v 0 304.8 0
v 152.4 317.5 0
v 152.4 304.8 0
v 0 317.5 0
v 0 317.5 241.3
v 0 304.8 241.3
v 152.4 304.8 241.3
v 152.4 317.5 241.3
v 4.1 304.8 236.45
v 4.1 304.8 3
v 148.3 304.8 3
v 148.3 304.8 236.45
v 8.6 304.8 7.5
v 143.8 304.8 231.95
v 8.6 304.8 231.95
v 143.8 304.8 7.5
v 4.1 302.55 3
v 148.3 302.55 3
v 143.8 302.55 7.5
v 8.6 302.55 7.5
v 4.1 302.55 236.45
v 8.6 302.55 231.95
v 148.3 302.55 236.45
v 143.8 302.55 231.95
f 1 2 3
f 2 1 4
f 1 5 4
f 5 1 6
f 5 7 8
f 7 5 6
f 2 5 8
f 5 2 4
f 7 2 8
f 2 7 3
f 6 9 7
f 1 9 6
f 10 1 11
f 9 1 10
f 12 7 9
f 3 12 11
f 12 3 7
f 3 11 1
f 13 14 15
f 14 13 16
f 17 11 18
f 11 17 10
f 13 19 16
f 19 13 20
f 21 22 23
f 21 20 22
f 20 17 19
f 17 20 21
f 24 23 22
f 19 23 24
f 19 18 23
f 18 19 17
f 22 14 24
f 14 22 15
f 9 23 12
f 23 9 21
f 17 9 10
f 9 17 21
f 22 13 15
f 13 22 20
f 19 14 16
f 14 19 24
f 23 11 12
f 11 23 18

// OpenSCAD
//Box Y = 9.5 inch
//Box Z = 12 inch
//Box X = 6 inch

$fn = 80;
//Dimensions are in mm

//Front/Back Panel
frontWidth = 152.4;
//Side Panel
sideWidth = 304.8;
//Top/Bottom Panel
topWidth = frontWidth;
topLength = sideWidth;

boxHeight = 241.3;
boxThickness = 12.7;

//subWoofer Dimensions
wooferDiameter = 122;
wooferX = sideWidth/2;
wooferY = 101.6;
wooferScrewDiameter = 2.5;
wooferScrewX = 51.75;
wooferScrewY = 51.75;

//Terminal Hole Dimensions
terminalDiameter = 5.5;
terminalY = (frontWidth)/2;
terminal1X =(sideWidth)/2 + 15;
terminal2X = (sideWidth)/2 - 15;

//port Dimensions
portDiameter = 67;
portX = (frontWidth)/2;
portY = boxHeight -57.15;

//Connection Joints/Grooves
grooveThickness = 6;
grooveDepth = 6;
connectThickness = 4.5;
connectDepth = 4.5;
// difference(){
// union(){
//     difference(){
//     //Front Panel
//     linear_extrude(boxHeight)
//     square([frontWidth, boxThickness]);

//     translate([portX, boxThickness, portY])
//     rotate([90,0, 0])
//     linear_extrude(boxThickness)
//     circle(d=portDiameter);     
//     };

//     //Side Panel
//     translate([0, sideWidth-boxThickness, 0])
//     rotate([90,0,0])
//     linear_extrude(sideWidth-boxThickness)
//     square([boxThickness, boxHeight]);

//     //Other Side Panel

//     difference(){
//         translate([frontWidth - boxThickness, sideWidth-boxThickness, 0])
//         rotate([90,0,0])
//         linear_extrude(sideWidth-boxThickness)
//         square([boxThickness, boxHeight]);
//         //Subwoofer position
//         translate([frontWidth - boxThickness,wooferX, wooferY ])
//         rotate([0,90,0])
//         linear_extrude(boxThickness)
//         circle(d = wooferDiameter);
        
//         //subWoofer Screws
//         translate([frontWidth - boxThickness, wooferX - wooferScrewX, wooferY - wooferScrewY])
//         rotate([0,90,0])
//         linear_extrude(boxThickness)
//         circle(d=wooferScrewDiameter);
        
//         translate([frontWidth - boxThickness, wooferX + wooferScrewX, wooferY - wooferScrewY])
//         rotate([0,90,0])
//         linear_extrude(boxThickness)
//         circle(d=wooferScrewDiameter);

//         translate([frontWidth - boxThickness, wooferX - wooferScrewX, wooferY + wooferScrewY])
//         rotate([0,90,0])
//         linear_extrude(boxThickness)
//         circle(d=wooferScrewDiameter);

//         translate([frontWidth - boxThickness, wooferX + wooferScrewX, wooferY + wooferScrewY])
//         rotate([0,90,0])
//         linear_extrude(boxThickness)
//         circle(d=wooferScrewDiameter);

//     }
//     //Bottom Panel
//     linear_extrude(boxThickness)
//     square([frontWidth, sideWidth-boxThickness]);
    
//     //Top Panel
//     difference(){
//     translate([0,0, boxHeight - boxThickness])
//     linear_extrude(boxThickness)
//     square([frontWidth, sideWidth-boxThickness]);
    
//     //Terminal holes
//     translate([terminalY, terminal1X, boxHeight- boxThickness])
//     linear_extrude(boxThickness)
//     circle(d = terminalDiameter);
//     translate([terminalY, terminal2X, boxHeight- boxThickness])
//     linear_extrude(boxThickness)
//     circle(d = terminalDiameter);
//     }

// }

// //Add grooves to box
// translate([frontWidth/2,sideWidth - boxThickness, grooveThickness/2])
// linear_extrude(grooveDepth)
// square([frontWidth - boxThickness, grooveThickness], center = true);

// translate([frontWidth/2,sideWidth - boxThickness,boxHeight - grooveThickness/2 - boxThickness/2])
// linear_extrude(grooveDepth)
// square([frontWidth - boxThickness, grooveThickness], center = true);

// translate([boxThickness/2, sideWidth - boxThickness, grooveThickness/2])
// linear_extrude(boxHeight - boxThickness/2)
// square([grooveThickness, grooveThickness], center = true);

// translate([frontWidth - boxThickness/2, sideWidth - boxThickness, grooveThickness/2])
// linear_extrude(boxHeight - boxThickness/2)
// square([grooveThickness, grooveThickness], center = true);
// }

    //Back Panel
translate([0, (sideWidth),0])
linear_extrude(boxHeight)
square([frontWidth, boxThickness]);

// //Add grooves to box
translate([frontWidth/2,sideWidth, grooveThickness/2])
linear_extrude(connectDepth)
square([frontWidth - boxThickness, connectThickness], center = true);

translate([frontWidth/2,sideWidth,boxHeight - grooveThickness/2 - boxThickness/2])
linear_extrude(connectDepth)
square([frontWidth - boxThickness, connectThickness], center = true);

translate([boxThickness/2, sideWidth, grooveThickness/2])
linear_extrude(boxHeight - boxThickness/2 - 1.5)
square([connectThickness, connectThickness], center = true);

translate([frontWidth - boxThickness/2, sideWidth, grooveThickness/2])
linear_extrude(boxHeight - boxThickness/2 - 1.5)
square([connectThickness, connectThickness], center = true);
